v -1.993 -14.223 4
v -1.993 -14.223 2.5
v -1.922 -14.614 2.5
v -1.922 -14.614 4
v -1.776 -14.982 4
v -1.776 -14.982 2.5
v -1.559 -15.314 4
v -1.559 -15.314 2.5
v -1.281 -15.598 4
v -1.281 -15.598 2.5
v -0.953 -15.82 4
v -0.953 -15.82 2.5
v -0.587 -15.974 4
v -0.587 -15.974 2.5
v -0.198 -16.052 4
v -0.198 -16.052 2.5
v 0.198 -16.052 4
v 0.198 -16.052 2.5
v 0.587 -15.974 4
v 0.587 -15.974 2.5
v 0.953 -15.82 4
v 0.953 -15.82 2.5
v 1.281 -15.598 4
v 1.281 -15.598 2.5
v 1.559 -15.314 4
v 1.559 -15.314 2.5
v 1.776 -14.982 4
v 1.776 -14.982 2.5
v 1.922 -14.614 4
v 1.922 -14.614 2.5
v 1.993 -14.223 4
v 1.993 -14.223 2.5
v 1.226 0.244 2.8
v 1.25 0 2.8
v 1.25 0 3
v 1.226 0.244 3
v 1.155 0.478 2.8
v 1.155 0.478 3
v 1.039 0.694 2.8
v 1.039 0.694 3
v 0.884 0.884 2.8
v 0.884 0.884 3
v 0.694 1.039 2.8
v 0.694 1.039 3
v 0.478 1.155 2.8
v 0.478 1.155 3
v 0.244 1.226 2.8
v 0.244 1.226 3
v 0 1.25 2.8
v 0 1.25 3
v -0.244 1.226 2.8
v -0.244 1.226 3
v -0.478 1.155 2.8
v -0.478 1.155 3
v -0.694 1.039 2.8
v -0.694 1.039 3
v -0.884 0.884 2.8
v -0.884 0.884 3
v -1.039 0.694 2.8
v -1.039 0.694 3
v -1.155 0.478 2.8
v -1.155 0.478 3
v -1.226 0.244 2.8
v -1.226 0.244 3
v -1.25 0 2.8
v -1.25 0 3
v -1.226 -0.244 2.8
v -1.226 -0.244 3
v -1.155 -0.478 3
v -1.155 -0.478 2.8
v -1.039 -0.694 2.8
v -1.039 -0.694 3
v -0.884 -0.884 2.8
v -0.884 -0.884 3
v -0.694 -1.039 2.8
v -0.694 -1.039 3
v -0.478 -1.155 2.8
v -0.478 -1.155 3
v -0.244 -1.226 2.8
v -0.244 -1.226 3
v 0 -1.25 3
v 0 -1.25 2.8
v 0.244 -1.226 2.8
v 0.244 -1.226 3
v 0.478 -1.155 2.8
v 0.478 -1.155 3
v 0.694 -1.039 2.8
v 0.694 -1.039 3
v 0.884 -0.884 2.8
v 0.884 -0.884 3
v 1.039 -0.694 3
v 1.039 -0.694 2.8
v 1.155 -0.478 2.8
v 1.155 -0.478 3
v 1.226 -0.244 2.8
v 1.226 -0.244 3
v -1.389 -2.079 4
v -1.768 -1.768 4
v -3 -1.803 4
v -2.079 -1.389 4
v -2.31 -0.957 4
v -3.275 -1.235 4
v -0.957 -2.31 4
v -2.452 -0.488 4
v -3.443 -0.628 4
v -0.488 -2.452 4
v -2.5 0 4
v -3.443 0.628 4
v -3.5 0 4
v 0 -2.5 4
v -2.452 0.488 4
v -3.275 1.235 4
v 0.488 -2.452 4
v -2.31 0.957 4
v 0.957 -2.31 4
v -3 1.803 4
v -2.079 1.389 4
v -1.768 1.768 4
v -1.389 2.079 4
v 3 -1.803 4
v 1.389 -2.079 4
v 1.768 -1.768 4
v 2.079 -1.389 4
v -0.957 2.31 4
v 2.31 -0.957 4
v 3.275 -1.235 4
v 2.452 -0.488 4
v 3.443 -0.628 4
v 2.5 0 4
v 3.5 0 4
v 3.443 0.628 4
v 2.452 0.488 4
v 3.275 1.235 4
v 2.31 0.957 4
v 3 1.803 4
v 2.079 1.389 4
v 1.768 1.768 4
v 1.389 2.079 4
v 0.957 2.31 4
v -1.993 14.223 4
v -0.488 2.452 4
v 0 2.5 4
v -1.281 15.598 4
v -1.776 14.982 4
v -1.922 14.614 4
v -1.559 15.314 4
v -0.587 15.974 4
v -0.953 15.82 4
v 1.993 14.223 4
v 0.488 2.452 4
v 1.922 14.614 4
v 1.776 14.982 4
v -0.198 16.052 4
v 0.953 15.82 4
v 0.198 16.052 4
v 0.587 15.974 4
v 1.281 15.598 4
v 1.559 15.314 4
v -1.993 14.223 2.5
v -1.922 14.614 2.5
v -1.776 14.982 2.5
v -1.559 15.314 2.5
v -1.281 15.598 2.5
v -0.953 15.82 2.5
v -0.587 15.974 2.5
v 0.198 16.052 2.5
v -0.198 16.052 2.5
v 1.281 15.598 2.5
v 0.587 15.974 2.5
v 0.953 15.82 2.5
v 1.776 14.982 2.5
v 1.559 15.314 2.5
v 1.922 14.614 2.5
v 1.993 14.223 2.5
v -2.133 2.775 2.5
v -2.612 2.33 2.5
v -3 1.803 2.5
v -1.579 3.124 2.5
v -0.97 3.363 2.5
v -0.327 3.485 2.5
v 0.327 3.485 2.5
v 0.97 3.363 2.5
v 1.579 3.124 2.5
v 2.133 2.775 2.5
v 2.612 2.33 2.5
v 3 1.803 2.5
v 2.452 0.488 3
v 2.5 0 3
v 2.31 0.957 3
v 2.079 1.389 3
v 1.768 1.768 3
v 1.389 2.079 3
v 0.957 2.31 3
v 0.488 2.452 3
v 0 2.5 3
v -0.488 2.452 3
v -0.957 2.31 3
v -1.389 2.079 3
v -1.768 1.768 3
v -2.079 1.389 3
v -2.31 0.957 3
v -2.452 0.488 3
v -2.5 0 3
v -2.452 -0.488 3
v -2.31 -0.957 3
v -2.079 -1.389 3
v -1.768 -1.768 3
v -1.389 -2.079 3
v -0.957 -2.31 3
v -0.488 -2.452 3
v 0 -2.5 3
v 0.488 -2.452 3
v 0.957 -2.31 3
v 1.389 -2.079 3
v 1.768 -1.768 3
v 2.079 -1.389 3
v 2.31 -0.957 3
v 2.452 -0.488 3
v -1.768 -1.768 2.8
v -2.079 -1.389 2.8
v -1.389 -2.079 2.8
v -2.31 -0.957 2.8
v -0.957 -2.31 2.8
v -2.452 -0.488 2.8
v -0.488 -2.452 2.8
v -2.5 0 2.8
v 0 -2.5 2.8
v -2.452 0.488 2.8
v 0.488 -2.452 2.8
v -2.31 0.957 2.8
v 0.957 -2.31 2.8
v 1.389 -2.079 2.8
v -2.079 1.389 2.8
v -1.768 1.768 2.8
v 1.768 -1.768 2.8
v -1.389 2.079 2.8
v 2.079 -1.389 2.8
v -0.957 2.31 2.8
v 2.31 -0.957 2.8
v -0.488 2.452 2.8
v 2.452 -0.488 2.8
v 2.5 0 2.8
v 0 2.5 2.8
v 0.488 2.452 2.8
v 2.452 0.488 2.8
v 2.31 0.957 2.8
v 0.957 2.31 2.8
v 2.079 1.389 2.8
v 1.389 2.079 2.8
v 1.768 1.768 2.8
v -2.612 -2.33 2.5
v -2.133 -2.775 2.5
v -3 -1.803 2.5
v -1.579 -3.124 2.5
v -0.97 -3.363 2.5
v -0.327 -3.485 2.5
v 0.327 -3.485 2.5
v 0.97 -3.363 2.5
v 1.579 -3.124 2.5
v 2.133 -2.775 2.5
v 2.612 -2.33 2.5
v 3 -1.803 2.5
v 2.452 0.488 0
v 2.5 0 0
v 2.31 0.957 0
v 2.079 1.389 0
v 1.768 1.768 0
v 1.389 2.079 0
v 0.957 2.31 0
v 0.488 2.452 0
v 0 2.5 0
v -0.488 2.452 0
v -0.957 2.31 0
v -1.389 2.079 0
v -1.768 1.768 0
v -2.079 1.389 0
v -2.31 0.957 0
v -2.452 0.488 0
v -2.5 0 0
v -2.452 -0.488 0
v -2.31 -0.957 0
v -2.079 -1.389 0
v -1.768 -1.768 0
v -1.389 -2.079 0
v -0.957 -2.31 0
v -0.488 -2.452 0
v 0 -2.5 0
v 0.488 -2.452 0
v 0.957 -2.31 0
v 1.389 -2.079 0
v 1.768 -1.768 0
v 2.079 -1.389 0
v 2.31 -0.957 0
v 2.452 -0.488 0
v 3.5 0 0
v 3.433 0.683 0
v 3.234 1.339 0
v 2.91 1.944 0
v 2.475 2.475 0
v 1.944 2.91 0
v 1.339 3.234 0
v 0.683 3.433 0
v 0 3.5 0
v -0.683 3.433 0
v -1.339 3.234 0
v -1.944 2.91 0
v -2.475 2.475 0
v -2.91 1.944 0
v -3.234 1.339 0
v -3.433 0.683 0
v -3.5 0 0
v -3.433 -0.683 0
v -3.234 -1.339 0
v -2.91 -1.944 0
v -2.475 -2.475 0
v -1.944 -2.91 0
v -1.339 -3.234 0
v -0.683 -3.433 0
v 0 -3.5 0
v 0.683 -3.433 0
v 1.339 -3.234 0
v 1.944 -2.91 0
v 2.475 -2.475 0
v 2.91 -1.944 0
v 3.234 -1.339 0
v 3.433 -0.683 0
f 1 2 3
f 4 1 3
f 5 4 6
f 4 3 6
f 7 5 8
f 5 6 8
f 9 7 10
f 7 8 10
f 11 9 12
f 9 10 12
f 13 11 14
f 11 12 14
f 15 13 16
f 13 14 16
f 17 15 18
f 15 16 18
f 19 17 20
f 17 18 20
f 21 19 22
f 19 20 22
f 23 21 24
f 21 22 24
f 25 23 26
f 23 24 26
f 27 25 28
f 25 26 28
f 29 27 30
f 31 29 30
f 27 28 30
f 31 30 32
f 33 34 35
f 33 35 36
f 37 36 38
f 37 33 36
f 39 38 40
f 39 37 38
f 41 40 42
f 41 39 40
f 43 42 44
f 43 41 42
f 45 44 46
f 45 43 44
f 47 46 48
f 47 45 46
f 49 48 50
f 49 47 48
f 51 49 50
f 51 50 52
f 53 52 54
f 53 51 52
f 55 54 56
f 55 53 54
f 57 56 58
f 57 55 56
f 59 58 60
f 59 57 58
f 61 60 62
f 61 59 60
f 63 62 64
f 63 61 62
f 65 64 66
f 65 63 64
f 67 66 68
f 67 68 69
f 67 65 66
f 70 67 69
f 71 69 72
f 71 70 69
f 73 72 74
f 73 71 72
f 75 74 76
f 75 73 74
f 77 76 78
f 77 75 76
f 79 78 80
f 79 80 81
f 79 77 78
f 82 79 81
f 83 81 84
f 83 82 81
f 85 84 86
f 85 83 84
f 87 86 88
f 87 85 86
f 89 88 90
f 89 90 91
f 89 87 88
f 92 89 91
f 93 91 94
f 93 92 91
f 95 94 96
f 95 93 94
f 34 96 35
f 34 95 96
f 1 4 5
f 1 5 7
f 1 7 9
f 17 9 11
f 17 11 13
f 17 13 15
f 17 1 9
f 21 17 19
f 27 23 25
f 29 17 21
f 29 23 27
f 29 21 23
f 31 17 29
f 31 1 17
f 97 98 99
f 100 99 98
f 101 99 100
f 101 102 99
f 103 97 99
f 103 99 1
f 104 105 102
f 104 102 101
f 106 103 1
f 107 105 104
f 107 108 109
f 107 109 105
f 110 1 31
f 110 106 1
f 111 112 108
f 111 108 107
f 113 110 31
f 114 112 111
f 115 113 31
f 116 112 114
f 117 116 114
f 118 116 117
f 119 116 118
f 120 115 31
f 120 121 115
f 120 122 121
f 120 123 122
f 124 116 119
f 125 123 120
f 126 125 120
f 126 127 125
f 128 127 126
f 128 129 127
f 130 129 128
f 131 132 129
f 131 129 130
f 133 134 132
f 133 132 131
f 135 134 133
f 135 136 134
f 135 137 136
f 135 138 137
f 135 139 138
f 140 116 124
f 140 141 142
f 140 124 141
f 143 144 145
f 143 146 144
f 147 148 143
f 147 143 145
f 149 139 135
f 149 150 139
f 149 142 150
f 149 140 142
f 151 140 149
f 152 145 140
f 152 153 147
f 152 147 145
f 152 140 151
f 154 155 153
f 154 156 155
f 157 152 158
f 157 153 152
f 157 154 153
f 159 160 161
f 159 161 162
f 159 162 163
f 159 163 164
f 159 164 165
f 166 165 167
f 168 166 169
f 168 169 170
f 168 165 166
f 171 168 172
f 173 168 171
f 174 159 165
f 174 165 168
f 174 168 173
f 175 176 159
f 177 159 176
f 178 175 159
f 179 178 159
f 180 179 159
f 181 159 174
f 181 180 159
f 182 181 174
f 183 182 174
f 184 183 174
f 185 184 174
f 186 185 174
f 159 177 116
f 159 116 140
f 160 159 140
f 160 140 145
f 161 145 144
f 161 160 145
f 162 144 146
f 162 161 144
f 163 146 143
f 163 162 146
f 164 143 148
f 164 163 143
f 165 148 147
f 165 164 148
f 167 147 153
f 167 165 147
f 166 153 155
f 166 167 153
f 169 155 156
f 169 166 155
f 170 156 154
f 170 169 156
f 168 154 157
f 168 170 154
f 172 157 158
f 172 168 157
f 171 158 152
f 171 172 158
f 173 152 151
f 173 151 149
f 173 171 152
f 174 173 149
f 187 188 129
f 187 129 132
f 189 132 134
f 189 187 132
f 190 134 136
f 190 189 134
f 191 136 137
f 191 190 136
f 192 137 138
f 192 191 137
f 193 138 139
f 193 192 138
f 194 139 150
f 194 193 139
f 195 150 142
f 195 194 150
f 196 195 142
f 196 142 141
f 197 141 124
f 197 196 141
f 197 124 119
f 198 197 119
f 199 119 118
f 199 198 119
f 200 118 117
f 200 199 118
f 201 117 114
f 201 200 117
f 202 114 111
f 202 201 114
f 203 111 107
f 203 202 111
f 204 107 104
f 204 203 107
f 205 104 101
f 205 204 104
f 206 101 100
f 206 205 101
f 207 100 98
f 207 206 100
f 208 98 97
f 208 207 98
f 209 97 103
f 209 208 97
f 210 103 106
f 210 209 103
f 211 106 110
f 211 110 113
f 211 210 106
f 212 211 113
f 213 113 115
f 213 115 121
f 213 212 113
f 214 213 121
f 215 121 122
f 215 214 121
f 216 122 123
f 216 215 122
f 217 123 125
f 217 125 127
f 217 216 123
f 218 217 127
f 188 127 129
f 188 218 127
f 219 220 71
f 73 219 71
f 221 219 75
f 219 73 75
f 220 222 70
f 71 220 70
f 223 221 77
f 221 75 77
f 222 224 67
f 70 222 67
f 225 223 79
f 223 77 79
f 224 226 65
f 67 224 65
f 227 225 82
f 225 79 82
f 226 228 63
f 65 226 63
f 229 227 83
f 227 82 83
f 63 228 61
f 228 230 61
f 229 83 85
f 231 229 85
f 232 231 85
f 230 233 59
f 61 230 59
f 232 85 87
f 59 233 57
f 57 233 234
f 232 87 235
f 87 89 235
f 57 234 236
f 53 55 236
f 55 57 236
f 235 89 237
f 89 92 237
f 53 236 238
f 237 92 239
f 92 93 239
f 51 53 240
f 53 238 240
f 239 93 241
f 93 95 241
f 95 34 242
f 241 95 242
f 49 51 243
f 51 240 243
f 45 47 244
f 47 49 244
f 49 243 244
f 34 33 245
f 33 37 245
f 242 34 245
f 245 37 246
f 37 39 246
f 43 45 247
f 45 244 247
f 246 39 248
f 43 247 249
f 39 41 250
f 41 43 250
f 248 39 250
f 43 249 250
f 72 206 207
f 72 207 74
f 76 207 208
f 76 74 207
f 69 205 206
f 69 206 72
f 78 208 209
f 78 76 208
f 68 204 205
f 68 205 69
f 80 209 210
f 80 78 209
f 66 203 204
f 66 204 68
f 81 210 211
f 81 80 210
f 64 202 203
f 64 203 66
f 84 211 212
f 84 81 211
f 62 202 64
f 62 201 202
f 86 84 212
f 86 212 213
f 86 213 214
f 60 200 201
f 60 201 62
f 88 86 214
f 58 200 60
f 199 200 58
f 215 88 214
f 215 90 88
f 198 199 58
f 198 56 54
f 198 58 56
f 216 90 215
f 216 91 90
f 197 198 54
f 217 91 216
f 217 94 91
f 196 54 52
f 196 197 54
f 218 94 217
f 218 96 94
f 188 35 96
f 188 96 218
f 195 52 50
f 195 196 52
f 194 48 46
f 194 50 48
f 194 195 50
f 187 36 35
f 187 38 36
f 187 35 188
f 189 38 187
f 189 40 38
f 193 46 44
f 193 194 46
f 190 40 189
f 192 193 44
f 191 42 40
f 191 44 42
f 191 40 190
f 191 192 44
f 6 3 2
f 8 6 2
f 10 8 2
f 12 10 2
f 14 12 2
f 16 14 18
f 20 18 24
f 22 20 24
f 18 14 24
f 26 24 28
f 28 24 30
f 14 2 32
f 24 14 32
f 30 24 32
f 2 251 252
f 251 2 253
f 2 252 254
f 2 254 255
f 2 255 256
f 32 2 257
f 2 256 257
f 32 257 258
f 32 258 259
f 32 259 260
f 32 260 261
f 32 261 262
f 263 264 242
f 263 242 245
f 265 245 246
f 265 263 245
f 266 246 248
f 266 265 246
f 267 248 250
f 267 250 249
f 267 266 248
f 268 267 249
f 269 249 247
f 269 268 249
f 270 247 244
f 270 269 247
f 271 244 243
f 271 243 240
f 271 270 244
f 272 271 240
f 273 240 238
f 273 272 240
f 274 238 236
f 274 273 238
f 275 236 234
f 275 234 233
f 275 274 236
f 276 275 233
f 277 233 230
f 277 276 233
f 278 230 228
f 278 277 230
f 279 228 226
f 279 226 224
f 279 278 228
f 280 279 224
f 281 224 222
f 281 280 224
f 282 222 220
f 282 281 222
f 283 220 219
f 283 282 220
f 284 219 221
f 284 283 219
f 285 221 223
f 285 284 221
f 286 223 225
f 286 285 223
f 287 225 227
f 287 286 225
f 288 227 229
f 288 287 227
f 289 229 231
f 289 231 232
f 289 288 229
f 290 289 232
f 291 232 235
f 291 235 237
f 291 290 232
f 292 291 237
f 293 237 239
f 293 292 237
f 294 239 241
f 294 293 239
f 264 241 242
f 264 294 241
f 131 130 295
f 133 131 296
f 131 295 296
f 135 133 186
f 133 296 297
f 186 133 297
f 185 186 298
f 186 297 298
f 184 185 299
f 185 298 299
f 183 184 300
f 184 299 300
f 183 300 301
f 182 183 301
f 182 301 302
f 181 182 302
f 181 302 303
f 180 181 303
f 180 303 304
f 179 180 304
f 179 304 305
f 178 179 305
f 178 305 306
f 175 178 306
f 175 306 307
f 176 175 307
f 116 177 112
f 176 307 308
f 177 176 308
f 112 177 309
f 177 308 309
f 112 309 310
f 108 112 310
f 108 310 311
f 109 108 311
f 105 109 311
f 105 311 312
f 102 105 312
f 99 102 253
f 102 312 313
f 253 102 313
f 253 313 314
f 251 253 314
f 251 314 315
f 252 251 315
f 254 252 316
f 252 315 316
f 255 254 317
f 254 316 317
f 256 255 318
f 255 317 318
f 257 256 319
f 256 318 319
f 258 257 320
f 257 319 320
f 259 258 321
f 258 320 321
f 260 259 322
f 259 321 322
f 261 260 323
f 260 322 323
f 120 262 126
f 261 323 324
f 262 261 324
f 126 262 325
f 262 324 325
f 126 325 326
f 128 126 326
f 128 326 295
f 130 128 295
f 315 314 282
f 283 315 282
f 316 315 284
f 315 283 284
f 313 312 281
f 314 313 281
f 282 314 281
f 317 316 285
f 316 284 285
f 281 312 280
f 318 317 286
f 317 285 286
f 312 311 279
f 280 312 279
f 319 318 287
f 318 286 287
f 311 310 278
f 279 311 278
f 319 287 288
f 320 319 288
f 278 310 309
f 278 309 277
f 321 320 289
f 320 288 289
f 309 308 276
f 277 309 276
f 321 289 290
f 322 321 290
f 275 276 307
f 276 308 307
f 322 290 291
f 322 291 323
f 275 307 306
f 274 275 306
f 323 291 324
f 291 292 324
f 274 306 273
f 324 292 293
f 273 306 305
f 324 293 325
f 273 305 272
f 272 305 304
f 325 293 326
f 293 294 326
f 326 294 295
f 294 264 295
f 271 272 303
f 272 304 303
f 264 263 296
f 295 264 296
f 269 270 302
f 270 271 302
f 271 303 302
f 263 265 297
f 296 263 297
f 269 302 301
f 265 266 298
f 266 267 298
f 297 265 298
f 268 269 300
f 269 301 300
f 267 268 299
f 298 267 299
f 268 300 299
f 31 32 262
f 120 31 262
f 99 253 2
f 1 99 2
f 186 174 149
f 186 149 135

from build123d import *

# Parameters (mm, degrees)
SKETCH1_R           = 3.5
SKETCH1_R_2         = 2.5
BOSS_EXTRUDE1_DEPTH = 2.8
SKETCH2_R           = 3.5
SKETCH2_R_2         = 1.25
BOSS_EXTRUDE2_DEPTH = 0.2
SKETCH3_R           = 3.5
SKETCH3_R_2         = 2.5
BOSS_EXTRUDE3_DEPTH = 1
BOSS_EXTRUDE4_START = -1.5
BOSS_EXTRUDE4_DEPTH = 1.5


with BuildPart() as part:
    # Sketch1 → Boss-Extrude1 (new body)
    with BuildSketch(Plane.XY):
        Circle(SKETCH1_R)
        Circle(SKETCH1_R_2, mode=Mode.SUBTRACT)
    extrude(amount=BOSS_EXTRUDE1_DEPTH)

    # Sketch2 → Boss-Extrude2 (add)
    with BuildSketch(Plane.XY.offset(2.8)):
        Circle(SKETCH2_R)
        Circle(SKETCH2_R_2, mode=Mode.SUBTRACT)
    extrude(amount=BOSS_EXTRUDE2_DEPTH)

    # Sketch3 → Boss-Extrude3 (add)
    with BuildSketch(Plane.XY.offset(3)):
        Circle(SKETCH3_R)
        Circle(SKETCH3_R_2, mode=Mode.SUBTRACT)
    extrude(amount=BOSS_EXTRUDE3_DEPTH)

    # Sketch4 → Boss-Extrude4 (add)
    with BuildSketch(Plane.XY.offset(4).offset(BOSS_EXTRUDE4_START)):
        with BuildLine():
            Line((-3, -1.802775638), (-1.993465051, -14.223343039))
            ThreePointArc((-1.993465051, -14.223343039), (0, -16.061797098), (1.993465051, -14.223343039))
            Line((1.993465051, -14.223343039), (3, -1.802775638))
            ThreePointArc((3, -1.802775638), (0, -3.5), (-3, -1.802775638))
        make_face()
    boss_extrude4 = extrude(amount=BOSS_EXTRUDE4_DEPTH)

    # Mirror1: Boss-Extrude4 across plane
    add(boss_extrude4.mirror(Plane.ZX))


solid = part.part
